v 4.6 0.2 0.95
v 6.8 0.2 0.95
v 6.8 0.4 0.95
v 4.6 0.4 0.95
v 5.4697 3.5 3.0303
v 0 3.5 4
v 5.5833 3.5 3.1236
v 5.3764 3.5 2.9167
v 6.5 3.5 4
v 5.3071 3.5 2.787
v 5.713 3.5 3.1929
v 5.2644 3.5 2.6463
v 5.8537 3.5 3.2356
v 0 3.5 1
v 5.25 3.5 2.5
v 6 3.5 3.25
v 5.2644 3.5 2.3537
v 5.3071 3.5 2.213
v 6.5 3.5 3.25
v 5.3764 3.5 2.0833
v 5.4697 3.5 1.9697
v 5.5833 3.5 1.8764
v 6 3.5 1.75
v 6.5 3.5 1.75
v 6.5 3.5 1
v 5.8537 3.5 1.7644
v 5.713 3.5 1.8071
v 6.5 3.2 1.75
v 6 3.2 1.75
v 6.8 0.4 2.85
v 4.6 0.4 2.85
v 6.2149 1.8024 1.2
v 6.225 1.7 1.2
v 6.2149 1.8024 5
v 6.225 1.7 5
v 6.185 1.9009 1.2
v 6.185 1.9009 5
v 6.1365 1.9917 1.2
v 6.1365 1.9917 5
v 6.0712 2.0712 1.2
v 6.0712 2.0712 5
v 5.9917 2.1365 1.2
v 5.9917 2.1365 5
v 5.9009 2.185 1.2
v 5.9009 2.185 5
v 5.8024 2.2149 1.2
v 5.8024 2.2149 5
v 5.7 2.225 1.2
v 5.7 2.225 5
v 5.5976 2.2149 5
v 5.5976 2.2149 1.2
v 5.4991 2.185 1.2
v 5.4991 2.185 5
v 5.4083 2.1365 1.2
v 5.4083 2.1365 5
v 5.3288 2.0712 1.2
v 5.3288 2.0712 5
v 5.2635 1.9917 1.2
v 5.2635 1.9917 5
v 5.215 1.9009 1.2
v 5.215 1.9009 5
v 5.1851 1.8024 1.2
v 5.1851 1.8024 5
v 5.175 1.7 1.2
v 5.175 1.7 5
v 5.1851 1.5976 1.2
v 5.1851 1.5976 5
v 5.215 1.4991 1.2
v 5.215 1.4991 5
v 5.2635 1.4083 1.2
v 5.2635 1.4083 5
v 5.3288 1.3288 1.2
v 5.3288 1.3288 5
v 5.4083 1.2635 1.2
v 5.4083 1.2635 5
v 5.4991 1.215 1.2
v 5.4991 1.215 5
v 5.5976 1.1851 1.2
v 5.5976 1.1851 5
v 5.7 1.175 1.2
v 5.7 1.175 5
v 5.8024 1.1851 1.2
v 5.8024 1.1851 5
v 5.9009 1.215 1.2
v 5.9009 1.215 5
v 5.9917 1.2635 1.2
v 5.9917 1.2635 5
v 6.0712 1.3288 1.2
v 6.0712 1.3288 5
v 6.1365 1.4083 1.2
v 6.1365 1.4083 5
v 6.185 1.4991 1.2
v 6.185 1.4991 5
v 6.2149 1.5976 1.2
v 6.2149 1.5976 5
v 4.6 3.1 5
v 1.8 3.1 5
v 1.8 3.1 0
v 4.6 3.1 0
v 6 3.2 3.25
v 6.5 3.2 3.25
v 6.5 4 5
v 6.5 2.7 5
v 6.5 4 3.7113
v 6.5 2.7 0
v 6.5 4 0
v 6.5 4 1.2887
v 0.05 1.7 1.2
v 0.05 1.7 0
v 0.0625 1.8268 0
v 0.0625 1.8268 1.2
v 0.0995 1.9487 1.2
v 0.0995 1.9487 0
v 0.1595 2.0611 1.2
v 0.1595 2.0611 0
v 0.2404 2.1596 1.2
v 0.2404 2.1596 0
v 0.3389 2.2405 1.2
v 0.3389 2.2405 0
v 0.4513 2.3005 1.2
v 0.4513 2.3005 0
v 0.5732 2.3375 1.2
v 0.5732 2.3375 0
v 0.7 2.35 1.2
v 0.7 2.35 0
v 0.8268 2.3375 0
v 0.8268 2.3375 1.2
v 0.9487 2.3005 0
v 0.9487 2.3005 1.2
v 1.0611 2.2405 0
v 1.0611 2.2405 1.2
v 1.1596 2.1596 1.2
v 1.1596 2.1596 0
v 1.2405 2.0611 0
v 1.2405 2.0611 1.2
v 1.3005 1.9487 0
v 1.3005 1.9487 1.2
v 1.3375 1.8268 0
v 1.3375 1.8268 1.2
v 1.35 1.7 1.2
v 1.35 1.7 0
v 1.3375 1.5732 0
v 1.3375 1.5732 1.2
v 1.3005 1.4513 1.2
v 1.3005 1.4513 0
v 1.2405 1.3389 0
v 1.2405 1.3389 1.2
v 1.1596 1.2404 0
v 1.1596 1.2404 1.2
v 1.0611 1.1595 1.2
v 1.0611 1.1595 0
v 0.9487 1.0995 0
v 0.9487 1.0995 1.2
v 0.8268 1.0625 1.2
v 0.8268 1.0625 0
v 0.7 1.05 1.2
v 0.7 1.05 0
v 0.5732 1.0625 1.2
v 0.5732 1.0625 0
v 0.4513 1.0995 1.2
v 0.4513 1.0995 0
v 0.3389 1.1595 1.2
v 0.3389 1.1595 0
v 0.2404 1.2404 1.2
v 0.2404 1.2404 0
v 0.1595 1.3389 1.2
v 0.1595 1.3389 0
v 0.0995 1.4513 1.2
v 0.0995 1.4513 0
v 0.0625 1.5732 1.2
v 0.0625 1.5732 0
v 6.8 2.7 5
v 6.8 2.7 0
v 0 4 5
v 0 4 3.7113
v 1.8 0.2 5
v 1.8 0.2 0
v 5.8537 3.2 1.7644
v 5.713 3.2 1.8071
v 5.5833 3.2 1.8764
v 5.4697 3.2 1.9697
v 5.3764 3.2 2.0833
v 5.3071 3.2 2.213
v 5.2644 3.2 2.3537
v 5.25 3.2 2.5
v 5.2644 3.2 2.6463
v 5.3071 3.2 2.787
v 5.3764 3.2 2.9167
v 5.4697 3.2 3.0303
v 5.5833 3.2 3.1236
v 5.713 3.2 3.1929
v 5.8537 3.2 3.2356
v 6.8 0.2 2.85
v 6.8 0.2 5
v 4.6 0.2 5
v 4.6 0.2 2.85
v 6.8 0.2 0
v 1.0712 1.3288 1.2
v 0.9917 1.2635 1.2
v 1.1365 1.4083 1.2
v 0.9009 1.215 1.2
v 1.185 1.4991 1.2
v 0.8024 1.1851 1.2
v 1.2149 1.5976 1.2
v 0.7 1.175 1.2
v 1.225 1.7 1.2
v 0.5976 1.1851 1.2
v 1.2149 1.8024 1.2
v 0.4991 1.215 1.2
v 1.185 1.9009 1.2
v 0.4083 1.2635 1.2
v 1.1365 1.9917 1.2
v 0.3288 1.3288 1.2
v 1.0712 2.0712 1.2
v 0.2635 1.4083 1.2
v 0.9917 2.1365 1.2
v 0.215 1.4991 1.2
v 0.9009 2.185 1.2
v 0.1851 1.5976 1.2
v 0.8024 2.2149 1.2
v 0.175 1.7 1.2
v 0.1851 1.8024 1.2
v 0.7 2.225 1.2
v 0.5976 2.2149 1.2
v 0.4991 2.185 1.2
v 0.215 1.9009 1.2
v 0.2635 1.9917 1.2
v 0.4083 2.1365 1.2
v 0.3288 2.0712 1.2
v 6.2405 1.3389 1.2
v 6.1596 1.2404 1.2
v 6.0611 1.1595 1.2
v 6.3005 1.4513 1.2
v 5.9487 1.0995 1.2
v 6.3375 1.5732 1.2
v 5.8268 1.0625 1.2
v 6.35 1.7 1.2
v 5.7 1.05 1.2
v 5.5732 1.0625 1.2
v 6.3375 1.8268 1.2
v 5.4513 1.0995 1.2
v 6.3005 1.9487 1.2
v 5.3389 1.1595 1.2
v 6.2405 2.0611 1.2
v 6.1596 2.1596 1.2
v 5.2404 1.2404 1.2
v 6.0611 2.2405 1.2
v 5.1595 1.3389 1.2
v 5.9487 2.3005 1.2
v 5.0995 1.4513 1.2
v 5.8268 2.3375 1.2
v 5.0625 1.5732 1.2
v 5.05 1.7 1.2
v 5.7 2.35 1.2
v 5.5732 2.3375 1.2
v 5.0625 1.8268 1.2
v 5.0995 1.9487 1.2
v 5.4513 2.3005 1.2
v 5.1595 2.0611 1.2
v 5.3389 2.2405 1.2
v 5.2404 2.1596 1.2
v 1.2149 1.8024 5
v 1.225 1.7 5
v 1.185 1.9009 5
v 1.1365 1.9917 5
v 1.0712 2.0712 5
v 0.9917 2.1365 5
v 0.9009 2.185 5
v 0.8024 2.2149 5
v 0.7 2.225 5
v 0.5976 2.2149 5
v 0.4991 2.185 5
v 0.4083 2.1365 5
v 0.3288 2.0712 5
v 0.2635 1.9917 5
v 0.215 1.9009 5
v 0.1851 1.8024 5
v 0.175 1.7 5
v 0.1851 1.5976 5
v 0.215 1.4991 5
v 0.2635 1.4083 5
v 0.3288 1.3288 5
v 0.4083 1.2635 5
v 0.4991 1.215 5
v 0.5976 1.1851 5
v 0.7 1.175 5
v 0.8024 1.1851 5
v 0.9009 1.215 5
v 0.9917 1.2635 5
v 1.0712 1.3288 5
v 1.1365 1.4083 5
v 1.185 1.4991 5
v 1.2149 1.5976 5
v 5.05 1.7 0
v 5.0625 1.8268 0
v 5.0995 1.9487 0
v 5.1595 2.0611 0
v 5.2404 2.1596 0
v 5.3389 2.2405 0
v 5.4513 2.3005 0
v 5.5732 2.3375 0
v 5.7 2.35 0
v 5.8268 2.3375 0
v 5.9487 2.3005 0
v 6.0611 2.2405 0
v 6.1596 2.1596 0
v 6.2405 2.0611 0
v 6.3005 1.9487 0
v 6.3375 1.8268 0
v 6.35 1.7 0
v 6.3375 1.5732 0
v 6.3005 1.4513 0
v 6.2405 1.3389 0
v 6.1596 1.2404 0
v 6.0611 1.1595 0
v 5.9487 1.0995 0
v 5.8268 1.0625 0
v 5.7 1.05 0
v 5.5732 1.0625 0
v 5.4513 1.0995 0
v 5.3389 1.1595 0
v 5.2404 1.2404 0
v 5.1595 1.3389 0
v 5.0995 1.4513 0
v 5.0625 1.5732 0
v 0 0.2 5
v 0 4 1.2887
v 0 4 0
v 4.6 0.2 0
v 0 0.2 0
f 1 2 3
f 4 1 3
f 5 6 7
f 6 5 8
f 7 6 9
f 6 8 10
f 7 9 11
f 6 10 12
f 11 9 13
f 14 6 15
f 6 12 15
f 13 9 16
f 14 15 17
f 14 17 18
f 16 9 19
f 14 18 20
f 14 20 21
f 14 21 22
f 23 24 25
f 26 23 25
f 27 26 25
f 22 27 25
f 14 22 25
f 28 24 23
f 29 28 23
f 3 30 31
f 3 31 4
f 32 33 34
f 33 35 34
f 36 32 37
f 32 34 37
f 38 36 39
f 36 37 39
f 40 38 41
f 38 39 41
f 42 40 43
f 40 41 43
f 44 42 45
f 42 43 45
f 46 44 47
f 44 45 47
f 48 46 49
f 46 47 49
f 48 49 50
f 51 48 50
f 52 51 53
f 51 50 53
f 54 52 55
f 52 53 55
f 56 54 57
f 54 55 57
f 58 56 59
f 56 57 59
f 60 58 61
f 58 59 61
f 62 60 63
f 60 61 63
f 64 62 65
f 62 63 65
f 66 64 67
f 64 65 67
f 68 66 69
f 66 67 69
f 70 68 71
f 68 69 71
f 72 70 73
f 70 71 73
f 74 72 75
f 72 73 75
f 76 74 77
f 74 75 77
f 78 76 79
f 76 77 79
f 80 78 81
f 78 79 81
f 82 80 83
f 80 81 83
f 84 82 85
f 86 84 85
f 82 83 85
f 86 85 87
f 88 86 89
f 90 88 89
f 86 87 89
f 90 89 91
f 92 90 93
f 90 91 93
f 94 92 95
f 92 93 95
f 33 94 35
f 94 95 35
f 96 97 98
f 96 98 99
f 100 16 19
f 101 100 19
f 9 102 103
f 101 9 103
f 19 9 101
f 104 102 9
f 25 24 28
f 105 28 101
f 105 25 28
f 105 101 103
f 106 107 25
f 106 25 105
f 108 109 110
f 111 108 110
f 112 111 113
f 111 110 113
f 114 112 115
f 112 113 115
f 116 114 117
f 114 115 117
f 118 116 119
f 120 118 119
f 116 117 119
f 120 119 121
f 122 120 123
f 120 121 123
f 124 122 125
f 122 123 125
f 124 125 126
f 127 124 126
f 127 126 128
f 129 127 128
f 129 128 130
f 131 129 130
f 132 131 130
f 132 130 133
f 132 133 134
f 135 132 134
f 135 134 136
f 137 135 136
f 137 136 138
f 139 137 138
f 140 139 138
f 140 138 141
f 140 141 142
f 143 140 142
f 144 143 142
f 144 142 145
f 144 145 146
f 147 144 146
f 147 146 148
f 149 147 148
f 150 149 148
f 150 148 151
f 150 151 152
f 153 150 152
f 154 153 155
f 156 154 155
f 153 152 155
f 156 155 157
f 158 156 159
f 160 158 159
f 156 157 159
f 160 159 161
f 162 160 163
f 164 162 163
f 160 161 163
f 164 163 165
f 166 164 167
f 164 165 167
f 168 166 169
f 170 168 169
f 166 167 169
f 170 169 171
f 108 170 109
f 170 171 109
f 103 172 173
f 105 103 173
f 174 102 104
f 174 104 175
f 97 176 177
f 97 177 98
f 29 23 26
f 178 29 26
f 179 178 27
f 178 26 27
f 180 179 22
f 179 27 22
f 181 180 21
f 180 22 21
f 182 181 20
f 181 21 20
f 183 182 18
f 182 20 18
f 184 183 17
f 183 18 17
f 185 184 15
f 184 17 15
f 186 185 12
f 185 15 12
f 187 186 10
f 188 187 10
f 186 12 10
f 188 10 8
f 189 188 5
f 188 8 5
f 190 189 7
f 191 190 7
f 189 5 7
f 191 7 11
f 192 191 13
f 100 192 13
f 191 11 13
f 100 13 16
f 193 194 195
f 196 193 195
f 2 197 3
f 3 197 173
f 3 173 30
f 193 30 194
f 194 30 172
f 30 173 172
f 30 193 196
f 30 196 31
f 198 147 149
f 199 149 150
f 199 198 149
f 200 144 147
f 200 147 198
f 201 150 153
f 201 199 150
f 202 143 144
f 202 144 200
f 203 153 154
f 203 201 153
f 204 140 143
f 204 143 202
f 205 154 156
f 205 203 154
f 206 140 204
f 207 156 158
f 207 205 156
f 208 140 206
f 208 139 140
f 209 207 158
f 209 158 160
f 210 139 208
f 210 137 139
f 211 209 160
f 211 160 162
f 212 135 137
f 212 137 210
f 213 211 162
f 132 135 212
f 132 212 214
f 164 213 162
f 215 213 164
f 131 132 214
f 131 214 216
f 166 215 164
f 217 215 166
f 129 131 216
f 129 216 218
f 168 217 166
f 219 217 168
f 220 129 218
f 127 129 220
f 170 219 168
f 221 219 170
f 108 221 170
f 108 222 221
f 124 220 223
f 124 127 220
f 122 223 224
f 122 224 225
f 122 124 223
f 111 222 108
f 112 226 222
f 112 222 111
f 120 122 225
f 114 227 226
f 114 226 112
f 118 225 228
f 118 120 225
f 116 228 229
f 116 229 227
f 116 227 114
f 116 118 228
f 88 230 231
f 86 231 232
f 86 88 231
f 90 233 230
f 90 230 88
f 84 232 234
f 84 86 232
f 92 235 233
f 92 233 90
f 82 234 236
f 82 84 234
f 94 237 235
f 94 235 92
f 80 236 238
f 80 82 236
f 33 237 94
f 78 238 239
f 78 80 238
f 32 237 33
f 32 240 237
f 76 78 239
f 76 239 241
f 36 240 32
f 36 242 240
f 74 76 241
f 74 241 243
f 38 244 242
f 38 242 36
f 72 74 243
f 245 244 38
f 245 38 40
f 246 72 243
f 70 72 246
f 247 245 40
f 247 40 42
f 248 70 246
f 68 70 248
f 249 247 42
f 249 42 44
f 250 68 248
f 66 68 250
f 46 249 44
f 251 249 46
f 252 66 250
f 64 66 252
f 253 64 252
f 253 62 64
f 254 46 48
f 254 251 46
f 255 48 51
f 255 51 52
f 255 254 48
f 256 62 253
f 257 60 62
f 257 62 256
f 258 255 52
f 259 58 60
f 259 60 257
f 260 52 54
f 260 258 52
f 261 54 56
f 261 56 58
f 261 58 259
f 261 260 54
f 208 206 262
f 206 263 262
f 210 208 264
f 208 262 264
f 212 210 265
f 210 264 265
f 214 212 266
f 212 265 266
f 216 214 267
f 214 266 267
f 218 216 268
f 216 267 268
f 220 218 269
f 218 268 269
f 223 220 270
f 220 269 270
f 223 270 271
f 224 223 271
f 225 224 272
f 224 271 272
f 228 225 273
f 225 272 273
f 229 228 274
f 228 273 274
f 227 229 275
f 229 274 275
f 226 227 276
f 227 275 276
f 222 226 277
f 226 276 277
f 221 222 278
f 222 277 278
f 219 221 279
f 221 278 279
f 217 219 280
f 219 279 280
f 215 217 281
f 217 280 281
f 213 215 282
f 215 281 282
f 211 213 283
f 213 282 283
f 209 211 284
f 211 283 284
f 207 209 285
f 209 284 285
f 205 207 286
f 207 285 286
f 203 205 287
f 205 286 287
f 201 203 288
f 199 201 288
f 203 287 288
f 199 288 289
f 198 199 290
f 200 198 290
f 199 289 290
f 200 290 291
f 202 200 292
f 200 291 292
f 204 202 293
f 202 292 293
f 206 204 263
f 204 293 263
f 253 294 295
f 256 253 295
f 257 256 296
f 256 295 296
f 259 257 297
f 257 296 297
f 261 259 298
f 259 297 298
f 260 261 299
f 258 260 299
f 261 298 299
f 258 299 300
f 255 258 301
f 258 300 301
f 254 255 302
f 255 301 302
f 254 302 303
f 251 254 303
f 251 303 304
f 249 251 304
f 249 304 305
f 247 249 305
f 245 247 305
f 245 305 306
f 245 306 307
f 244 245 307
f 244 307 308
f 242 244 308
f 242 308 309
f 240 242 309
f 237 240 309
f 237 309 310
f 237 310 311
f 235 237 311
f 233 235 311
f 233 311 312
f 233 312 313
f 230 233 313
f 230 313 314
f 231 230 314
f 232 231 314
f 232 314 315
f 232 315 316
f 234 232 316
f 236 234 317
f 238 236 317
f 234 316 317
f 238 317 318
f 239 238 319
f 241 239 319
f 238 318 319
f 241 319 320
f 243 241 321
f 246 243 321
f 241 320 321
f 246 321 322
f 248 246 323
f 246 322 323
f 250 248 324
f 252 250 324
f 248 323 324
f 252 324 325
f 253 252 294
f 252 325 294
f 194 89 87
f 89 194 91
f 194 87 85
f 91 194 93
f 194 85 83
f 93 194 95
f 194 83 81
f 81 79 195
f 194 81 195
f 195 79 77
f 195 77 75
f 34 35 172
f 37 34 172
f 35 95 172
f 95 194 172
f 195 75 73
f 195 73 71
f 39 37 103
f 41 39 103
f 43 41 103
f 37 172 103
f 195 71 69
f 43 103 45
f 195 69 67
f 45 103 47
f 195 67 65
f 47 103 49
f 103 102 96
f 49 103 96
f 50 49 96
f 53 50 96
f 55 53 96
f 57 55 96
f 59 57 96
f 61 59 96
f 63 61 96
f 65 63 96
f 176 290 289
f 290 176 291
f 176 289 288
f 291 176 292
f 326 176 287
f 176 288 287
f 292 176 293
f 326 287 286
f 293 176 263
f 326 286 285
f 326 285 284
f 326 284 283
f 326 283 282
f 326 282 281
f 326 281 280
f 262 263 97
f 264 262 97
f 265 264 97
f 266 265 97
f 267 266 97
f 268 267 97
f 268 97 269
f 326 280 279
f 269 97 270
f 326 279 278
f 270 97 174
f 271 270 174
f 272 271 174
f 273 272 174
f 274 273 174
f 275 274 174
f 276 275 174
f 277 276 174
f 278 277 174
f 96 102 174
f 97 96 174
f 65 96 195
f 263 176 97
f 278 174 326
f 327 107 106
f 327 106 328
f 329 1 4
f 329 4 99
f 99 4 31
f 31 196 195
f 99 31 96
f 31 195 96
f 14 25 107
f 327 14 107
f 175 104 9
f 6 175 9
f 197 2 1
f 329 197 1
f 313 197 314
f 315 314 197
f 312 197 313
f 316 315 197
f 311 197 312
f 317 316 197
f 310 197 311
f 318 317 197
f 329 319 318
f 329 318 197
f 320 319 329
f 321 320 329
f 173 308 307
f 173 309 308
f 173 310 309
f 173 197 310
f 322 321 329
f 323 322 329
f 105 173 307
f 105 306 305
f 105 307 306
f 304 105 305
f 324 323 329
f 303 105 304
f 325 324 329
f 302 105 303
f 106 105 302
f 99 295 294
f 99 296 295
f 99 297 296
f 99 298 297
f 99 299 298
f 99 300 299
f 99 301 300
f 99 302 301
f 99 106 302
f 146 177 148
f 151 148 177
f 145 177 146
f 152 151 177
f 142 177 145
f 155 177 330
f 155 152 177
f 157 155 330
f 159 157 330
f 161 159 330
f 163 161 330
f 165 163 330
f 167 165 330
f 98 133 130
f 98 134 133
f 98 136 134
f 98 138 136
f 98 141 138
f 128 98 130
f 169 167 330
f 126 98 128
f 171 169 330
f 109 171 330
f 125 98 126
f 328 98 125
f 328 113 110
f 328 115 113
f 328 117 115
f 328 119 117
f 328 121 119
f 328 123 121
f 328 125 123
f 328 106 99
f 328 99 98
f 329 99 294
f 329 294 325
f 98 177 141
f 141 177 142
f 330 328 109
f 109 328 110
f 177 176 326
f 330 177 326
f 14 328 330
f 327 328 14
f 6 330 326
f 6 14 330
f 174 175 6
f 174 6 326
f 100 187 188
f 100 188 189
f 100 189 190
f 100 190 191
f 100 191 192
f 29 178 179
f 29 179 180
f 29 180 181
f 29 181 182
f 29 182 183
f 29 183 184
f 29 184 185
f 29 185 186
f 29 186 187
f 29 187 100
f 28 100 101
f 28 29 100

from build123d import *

# Parameters (mm, degrees)
SKETCH1_W           = 6.8
SKETCH1_H           = 5
BOSS_EXTRUDE1_DEPTH = 3.8
SKETCH3_W           = 2.8
SKETCH3_H           = 2.9
CUT_EXTRUDE2_DEPTH  = 10.340235543
SKETCH4_W           = 1.9
SKETCH4_H           = 0.2
CUT_EXTRUDE3_DEPTH  = 2.2
HOLE1_D             = 1.05
HOLE1_CBORE_D       = 1.3
HOLE1_CBORE_DEPTH   = 1.2
CUT_EXTRUDE9_DEPTH  = 10.340235543
CUT_EXTRUDE10_DEPTH = 0.3
SKETCH20_W          = 5
SKETCH20_H          = 1.3
CUT_EXTRUDE11_DEPTH = 0.3


with BuildPart() as part:
    # Sketch1 → Boss-Extrude1 (new body)
    with BuildSketch(Plane(origin=(0, 4, 0), x_dir=(-1, 0, 0), z_dir=(0, 1, 0))):
        with Locations((-3.4, 2.5)):
            Rectangle(SKETCH1_W, SKETCH1_H)
    extrude(amount=-BOSS_EXTRUDE1_DEPTH)

    # Sketch3 → Cut-Extrude2 (cut, through all)
    with BuildSketch(Plane.XY.offset(5)):
        with Locations((3.2, 1.65)):
            Rectangle(SKETCH3_W, SKETCH3_H)
    extrude(amount=-CUT_EXTRUDE2_DEPTH, mode=Mode.SUBTRACT)

    # Sketch4 → Cut-Extrude3 (cut)
    with BuildSketch(Plane(origin=(6.8, 0, 0), x_dir=(0, 0, -1), z_dir=(1, 0, 0))):
        with Locations((-1.9, 0.3)):
            Rectangle(SKETCH4_W, SKETCH4_H)
    extrude(amount=-CUT_EXTRUDE3_DEPTH, mode=Mode.SUBTRACT)

    # Hole1 (through all)
    with Locations(Plane(origin=(0, 0, 0), x_dir=(-1, 0, 0), z_dir=(0, 0, -1))):
        with Locations((-5.7, 1.7), (-0.7, 1.7)):
            CounterBoreHole(HOLE1_D / 2, HOLE1_CBORE_D / 2, HOLE1_CBORE_DEPTH)

    # Sketch18 → Cut-Extrude9 (cut, through all)
    with BuildSketch(Plane(origin=(6.8, 0, 0), x_dir=(0, 0, -1), z_dir=(1, 0, 0))):
        Polygon((-1.288675135, 4), (-3.711324865, 4), (-4, 3.5), (-1, 3.5), align=None)
    extrude(amount=-CUT_EXTRUDE9_DEPTH, mode=Mode.SUBTRACT)

    # Sketch19 → Cut-Extrude10 (cut)
    with BuildSketch(Plane(origin=(0, 3.5, 0), x_dir=(1, 0, 0), z_dir=(0, 1, 0))):
        with BuildLine():
            Line((6.8, -1.75), (6, -1.75))
            ThreePointArc((6, -1.75), (6.530330086, -1.969669914), (6.75, -2.5))
            ThreePointArc((6.75, -2.5), (6.530330086, -3.030330086), (6, -3.25))
            Line((6, -3.25), (6.8, -3.25))
            Line((6.8, -3.25), (6.8, -1.75))
        make_face()
        with BuildLine():
            ThreePointArc((6.75, -2.5), (6.530330086, -1.969669914), (6, -1.75))
            Line((6, -1.75), (6, -3.25))
            ThreePointArc((6, -3.25), (6.530330086, -3.030330086), (6.75, -2.5))
        make_face()
        with BuildLine():
            Line((6, -3.25), (6, -1.75))
            ThreePointArc((6, -1.75), (5.25, -2.5), (6, -3.25))
        make_face()
    extrude(amount=-CUT_EXTRUDE10_DEPTH, mode=Mode.SUBTRACT)

    # Sketch20 → Cut-Extrude11 (cut)
    with BuildSketch(Plane(origin=(6.8, 0, 0), x_dir=(0, 0, -1), z_dir=(1, 0, 0))):
        with Locations((-2.5, 3.35)):
            Rectangle(SKETCH20_W, SKETCH20_H)
    extrude(amount=-CUT_EXTRUDE11_DEPTH, mode=Mode.SUBTRACT)


solid = part.part
